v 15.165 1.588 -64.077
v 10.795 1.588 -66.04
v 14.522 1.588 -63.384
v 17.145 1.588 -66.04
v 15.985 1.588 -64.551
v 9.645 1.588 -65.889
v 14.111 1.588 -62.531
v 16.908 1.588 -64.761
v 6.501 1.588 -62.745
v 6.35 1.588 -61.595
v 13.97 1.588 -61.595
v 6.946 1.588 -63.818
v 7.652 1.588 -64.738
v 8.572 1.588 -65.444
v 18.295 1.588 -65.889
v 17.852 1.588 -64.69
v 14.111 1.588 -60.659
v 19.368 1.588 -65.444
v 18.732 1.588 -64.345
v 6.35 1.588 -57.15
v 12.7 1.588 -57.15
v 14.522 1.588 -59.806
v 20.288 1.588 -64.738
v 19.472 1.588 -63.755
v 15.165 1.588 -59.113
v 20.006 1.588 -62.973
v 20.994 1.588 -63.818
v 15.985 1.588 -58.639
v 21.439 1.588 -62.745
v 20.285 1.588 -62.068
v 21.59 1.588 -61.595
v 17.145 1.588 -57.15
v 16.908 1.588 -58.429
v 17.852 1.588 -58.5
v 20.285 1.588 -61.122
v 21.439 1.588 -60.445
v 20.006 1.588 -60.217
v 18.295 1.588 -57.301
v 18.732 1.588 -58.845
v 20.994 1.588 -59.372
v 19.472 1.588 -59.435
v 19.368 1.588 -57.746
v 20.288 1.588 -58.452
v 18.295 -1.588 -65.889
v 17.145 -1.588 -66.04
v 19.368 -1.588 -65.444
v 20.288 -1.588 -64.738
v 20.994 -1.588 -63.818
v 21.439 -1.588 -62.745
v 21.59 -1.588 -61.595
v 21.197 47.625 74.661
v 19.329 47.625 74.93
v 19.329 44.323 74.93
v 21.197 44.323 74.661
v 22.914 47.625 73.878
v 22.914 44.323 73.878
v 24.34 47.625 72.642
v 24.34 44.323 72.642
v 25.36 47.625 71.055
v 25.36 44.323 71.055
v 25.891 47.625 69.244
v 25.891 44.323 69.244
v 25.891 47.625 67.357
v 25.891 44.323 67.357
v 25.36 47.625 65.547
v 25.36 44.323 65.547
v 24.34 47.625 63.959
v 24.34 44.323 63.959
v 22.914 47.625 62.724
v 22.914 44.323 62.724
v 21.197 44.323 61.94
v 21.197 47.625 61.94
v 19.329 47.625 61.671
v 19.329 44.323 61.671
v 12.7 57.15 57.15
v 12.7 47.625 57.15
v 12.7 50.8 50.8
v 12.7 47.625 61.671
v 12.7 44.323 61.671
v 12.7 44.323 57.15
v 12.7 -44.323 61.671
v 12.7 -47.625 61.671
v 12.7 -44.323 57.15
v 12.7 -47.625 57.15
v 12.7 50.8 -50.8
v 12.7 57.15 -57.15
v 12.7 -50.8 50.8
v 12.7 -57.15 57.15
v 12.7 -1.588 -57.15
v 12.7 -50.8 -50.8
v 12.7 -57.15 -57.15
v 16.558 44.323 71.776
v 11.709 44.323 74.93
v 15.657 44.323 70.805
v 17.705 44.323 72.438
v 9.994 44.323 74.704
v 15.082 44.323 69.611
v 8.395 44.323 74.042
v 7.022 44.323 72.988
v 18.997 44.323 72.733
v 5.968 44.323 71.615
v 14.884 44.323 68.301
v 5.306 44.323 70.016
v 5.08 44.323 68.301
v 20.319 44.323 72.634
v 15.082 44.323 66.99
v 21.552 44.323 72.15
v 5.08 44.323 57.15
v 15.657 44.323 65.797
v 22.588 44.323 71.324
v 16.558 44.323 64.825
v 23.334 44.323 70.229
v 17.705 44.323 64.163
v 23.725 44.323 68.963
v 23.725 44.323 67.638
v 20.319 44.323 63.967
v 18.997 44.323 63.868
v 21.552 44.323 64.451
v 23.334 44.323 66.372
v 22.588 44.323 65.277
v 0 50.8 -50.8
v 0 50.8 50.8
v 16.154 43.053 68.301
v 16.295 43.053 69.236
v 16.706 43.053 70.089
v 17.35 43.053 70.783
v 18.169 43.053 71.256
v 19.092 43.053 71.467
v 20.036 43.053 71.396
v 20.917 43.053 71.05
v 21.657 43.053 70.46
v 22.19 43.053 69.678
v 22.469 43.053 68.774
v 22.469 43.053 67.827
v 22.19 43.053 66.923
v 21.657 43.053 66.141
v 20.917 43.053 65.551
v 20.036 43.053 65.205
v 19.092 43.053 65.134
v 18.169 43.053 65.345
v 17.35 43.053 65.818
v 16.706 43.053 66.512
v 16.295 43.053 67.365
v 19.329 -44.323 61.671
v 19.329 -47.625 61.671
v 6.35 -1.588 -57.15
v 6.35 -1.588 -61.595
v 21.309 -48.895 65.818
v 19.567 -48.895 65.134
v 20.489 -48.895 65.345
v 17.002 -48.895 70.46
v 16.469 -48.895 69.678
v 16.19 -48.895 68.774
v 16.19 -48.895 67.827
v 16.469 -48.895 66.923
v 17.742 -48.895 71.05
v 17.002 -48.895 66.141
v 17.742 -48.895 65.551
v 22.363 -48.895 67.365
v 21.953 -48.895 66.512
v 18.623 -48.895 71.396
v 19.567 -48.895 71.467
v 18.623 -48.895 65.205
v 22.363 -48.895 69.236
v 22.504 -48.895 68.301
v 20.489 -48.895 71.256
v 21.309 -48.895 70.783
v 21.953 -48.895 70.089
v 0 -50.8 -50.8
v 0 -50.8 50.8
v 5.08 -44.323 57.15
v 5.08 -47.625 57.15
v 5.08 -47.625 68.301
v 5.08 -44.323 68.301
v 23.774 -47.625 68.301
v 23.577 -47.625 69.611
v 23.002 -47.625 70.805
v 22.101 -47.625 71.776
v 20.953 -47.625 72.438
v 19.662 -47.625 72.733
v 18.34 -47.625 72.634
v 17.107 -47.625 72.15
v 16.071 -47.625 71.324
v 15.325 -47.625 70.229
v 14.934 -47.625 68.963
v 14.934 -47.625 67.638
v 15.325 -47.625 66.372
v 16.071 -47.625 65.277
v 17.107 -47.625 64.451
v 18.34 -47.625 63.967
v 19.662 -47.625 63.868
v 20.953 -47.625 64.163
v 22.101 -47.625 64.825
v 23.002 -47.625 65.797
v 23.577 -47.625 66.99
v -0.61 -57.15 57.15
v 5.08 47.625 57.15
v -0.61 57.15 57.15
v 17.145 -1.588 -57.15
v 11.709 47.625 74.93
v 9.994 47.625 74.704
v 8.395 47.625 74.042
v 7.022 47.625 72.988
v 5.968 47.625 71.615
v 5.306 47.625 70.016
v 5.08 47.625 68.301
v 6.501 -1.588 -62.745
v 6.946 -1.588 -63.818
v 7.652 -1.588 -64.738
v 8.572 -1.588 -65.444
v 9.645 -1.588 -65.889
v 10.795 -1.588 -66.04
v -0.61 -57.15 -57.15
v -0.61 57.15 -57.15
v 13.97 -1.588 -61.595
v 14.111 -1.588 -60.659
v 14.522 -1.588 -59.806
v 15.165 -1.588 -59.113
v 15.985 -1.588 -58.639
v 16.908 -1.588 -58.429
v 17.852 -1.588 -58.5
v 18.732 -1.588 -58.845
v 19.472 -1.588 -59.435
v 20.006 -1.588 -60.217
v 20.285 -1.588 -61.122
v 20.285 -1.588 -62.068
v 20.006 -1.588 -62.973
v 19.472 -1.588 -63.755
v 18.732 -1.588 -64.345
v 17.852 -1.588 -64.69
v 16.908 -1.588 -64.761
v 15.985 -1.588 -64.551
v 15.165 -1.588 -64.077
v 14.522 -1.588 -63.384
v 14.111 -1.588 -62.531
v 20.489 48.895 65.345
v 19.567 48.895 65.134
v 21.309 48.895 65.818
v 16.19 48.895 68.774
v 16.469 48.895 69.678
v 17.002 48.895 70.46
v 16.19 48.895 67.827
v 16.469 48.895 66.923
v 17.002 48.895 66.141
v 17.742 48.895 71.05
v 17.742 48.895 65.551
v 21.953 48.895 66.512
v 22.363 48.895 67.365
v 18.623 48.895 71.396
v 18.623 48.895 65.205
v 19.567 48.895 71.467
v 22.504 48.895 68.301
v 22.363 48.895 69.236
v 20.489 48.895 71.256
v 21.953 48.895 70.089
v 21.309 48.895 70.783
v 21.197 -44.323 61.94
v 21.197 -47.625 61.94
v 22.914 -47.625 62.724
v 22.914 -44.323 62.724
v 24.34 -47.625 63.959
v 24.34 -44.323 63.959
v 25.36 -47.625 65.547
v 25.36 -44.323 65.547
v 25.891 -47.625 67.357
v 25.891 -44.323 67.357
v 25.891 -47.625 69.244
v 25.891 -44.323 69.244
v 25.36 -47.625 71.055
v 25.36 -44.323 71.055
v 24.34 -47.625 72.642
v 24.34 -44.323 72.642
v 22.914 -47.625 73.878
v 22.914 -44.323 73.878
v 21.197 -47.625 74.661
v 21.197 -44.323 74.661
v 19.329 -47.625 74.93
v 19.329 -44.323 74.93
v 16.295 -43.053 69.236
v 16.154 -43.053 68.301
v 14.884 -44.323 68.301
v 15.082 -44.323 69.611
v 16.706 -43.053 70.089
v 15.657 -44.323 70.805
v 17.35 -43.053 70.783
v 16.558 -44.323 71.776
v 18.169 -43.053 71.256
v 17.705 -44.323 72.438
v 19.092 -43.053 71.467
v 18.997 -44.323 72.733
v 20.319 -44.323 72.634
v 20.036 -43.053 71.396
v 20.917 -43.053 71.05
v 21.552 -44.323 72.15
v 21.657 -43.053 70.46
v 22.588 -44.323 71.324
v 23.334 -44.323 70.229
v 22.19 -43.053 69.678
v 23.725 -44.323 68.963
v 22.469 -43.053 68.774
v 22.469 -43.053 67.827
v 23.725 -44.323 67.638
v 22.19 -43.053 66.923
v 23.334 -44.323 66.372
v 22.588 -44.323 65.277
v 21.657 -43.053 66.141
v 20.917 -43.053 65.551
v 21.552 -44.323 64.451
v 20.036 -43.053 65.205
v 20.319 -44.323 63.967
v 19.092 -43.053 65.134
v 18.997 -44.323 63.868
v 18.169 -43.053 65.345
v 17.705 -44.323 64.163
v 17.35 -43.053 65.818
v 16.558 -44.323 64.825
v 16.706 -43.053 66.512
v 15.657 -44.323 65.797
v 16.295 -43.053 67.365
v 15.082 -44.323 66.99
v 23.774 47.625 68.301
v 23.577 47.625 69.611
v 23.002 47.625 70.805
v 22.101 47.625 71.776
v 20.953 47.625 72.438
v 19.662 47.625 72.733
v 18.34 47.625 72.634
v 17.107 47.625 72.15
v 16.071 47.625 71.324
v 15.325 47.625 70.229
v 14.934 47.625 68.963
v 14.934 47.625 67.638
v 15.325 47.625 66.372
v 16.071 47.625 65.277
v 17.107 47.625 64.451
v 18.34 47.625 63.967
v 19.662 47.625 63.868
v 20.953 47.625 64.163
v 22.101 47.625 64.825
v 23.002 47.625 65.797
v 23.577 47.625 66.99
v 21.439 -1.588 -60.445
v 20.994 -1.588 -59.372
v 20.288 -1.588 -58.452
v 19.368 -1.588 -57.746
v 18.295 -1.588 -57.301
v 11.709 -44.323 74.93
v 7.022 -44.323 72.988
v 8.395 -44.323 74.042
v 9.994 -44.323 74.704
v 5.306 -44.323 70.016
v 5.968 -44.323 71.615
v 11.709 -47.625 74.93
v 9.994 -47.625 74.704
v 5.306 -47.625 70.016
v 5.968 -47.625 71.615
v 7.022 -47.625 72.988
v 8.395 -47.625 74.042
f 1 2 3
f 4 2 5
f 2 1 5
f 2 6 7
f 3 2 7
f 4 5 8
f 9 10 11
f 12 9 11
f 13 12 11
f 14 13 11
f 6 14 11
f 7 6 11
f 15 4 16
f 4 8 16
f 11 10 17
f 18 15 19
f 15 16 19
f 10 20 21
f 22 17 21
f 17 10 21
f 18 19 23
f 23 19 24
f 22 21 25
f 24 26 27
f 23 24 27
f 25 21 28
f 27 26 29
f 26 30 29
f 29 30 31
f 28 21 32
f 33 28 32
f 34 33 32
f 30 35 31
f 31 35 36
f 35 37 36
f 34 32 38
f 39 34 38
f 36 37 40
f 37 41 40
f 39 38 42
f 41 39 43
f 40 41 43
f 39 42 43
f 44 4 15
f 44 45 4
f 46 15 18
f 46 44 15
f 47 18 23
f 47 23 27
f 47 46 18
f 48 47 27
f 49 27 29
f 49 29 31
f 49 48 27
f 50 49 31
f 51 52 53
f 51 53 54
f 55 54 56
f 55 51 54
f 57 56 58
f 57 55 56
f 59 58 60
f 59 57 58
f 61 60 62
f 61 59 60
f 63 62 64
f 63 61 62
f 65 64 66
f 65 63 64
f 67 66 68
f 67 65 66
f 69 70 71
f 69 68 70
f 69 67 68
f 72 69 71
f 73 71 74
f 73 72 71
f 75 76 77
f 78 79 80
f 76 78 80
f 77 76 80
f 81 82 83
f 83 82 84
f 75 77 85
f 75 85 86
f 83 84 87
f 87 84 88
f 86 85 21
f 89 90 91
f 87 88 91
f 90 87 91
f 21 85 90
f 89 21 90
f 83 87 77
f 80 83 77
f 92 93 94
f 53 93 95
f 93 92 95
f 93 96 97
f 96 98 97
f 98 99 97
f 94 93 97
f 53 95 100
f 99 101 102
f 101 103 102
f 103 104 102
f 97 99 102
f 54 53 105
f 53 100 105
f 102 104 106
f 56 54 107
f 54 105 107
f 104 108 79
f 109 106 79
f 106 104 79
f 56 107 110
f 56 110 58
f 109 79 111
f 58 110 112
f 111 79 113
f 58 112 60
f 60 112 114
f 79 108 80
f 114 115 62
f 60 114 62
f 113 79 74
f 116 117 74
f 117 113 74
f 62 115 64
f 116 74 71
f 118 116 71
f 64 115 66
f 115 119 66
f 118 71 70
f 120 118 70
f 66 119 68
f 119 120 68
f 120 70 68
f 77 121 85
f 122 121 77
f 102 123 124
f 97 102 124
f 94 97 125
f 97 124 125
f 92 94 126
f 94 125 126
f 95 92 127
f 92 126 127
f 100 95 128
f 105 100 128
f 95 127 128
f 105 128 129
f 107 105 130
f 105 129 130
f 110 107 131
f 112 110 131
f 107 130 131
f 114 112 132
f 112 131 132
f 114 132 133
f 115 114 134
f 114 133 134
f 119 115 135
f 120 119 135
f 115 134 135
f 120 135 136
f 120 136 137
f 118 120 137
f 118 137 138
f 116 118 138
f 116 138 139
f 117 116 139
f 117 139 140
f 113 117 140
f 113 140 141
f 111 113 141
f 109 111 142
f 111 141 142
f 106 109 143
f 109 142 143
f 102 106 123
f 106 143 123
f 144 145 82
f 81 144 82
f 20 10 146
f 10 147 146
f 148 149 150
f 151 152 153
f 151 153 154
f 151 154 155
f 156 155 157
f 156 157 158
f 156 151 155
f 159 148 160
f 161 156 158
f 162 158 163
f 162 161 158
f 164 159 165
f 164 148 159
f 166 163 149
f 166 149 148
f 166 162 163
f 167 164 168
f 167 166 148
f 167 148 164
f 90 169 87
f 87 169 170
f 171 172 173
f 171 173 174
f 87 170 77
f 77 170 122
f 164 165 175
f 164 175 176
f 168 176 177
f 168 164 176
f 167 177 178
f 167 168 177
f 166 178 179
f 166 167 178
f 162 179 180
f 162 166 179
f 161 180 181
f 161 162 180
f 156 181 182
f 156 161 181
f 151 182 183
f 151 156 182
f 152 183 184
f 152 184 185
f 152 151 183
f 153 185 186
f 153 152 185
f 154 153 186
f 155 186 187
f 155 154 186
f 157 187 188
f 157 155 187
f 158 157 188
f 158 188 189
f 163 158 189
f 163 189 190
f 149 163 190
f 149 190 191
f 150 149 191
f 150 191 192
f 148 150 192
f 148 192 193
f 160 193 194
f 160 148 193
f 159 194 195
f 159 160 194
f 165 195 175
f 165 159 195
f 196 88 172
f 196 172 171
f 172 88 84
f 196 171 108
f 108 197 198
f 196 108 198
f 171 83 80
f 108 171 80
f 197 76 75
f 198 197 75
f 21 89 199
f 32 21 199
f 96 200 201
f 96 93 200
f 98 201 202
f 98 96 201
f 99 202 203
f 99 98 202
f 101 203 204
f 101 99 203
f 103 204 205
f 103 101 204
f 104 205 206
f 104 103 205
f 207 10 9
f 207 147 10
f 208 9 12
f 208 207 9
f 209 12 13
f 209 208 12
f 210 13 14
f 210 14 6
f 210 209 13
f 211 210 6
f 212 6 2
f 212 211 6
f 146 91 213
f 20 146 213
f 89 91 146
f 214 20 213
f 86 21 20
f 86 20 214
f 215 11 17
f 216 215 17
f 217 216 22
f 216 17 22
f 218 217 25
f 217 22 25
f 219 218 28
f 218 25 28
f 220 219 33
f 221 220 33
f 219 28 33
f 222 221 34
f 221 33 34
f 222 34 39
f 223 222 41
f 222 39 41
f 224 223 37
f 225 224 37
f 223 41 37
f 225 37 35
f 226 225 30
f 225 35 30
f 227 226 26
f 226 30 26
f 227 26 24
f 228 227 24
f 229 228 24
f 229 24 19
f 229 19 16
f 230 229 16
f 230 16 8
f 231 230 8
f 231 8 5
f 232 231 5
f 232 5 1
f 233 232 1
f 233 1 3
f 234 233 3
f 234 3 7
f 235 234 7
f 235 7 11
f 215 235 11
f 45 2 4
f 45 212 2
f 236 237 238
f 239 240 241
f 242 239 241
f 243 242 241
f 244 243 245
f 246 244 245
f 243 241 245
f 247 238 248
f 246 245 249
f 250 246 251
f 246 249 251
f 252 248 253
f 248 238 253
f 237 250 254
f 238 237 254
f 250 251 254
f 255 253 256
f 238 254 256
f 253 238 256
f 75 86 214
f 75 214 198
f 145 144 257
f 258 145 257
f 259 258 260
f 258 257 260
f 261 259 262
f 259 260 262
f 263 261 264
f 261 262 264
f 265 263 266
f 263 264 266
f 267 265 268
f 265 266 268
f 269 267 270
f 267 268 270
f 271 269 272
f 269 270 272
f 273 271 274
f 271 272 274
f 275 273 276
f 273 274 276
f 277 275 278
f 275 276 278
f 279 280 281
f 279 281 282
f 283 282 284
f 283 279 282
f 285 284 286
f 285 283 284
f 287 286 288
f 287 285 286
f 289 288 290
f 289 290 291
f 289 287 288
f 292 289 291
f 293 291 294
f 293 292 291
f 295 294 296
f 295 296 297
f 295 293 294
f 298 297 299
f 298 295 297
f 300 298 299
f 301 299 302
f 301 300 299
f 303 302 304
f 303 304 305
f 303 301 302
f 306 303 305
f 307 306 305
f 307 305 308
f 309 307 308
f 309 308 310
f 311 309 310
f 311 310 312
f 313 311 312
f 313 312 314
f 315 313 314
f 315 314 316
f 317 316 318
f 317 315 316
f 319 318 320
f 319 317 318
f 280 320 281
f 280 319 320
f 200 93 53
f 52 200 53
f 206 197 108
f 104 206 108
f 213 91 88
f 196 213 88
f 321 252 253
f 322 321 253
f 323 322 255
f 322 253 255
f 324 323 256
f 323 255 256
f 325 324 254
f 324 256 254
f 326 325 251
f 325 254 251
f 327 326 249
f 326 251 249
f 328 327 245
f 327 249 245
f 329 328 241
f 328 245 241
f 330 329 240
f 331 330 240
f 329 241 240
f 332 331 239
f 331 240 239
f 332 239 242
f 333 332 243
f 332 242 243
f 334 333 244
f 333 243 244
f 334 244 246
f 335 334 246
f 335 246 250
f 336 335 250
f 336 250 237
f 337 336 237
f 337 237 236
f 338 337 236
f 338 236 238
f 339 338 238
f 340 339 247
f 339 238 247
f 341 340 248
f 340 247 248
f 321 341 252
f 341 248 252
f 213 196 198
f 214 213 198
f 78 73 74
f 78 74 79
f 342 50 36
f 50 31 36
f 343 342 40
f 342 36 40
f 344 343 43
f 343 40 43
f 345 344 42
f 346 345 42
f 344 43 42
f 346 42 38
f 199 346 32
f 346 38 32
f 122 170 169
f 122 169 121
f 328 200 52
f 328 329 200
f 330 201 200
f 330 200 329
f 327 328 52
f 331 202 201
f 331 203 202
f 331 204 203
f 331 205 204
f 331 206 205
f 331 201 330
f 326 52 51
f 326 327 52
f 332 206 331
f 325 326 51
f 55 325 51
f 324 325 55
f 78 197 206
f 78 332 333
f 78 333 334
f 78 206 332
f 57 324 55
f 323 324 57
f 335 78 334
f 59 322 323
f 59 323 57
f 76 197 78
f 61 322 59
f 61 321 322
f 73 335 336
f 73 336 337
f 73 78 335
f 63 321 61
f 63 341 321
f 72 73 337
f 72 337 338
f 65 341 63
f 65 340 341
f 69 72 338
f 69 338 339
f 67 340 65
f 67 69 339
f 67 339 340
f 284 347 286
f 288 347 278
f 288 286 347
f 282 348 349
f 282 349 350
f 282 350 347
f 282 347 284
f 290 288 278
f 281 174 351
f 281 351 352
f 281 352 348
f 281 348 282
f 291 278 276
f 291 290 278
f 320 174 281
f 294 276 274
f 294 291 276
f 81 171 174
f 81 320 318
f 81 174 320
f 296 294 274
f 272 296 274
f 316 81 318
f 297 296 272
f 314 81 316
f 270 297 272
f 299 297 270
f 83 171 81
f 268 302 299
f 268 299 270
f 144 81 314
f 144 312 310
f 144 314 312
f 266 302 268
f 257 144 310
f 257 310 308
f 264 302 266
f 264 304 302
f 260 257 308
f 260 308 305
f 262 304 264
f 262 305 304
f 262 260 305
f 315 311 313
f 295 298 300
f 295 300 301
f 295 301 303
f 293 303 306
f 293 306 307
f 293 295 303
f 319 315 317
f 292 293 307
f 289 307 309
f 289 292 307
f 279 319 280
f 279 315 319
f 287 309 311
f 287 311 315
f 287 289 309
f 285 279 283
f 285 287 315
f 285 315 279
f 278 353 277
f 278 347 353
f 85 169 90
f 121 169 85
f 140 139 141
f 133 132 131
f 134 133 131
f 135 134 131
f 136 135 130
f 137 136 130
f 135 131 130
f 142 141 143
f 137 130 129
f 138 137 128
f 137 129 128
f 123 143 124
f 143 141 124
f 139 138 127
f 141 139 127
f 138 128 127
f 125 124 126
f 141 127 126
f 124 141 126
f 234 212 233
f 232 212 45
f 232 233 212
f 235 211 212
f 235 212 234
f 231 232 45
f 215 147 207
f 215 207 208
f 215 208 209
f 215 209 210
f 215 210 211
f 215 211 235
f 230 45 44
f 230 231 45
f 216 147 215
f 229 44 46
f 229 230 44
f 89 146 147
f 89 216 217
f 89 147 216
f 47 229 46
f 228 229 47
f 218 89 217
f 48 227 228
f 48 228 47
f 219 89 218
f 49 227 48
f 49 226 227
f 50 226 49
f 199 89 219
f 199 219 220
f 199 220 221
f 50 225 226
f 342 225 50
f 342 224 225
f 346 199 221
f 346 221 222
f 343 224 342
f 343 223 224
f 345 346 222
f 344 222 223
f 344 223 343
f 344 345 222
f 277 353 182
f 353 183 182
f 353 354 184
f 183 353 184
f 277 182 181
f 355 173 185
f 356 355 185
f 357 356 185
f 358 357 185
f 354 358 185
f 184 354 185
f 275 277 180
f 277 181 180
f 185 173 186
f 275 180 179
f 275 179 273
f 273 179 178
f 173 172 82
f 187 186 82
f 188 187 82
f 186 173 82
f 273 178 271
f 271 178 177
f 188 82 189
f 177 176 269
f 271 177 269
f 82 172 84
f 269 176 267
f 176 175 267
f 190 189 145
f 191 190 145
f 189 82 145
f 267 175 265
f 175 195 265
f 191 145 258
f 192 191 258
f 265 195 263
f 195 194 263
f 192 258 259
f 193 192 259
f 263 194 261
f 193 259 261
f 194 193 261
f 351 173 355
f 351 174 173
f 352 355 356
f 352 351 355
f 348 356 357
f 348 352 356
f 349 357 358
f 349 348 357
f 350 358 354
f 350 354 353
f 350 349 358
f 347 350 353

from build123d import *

# Parameters (mm, degrees)
F0_W      = 114.3
F0_H      = 114.3
F0_W_2    = 101.6
F0_H_2    = 101.6
F1_DEPTH  = 12.7
F2_W      = 114.3
F2_H      = 114.3
F3_DEPTH  = 0.6096
F4_W      = 20.8788
F4_H      = 3.302
F5_DEPTH  = 17.78
F6_R      = 6.6294
F8_DEPTH  = 6.35
F9_R      = 6.6294
F10_R     = 4.445
F11_DEPTH = 1.27
F12_R     = 4.445
F13_DEPTH = 1.27
F14_SIZE  = 1.26999
F15_W     = 15.24
F15_H     = 8.89
F16_DEPTH = 1.5875
F17_R     = 4.44499
F18_R     = 3.175
F19_DEPTH = 25.4


# Not quite as in the source:
# - a fillet or chamfer is up to 0.001 mm smaller than in the source, because OpenCascade refuses the exact size
# - a pattern or mirror of a feature is missing from the dataset's text; its kind, count and spacing are read off the source's solid


with BuildPart() as f1:
    # F0 (on Right) → F1 (new body)
    with BuildSketch(Plane.YZ):
        Rectangle(F0_W, F0_H)
        Rectangle(F0_W_2, F0_H_2, mode=Mode.SUBTRACT)
    extrude(amount=F1_DEPTH)

    # F2 (on Right) → F3 (join)
    with BuildSketch(Plane.YZ):
        Rectangle(F2_W, F2_H)
    extrude(amount=-F3_DEPTH)

    # F4 (on face) → F5 (join)
    with BuildSketch(Plane.XY.offset(57.15)):
        with Locations((15.5194, -45.974)):
            Rectangle(F4_W, F4_H)
    f5 = extrude(amount=F5_DEPTH)

    # F5_copies: F5 across plane
    add(f5.mirror(Plane.ZX))

    # F6
    f6_edges = [f1.edges().sort_by_distance(p)[0] for p in [
        (25.9588, -45.974, 74.93),
    ]]
    fillet(f6_edges, radius=F6_R)

    # F7 (on face) → F8 (cut)
    with BuildSketch(Plane.XZ.offset(47.625)):
        with BuildLine():
            ThreePointArc((19.3294, 74.93), (25.9588, 68.3006), (19.3294, 61.6712))
            Line((19.3294, 61.6712), (12.7, 61.6712))
            Line((12.7, 61.6712), (12.7, 57.15))
            Line((12.7, 57.15), (28.7029210806, 51.0326394975))
            Line((28.7029210806, 51.0326394975), (31.0219925225, 81.4440133214))
            Line((31.0219925225, 81.4440133214), (19.3294, 74.93))
        make_face()
    f8 = extrude(amount=-F8_DEPTH, mode=Mode.SUBTRACT)

    # F8_copies: F8 across plane
    add(f8.mirror(Plane.ZX), mode=Mode.SUBTRACT)

    # F9
    f9_edges = [f1.edges().sort_by_distance(p)[0] for p in [
        (5.08, -45.974, 74.93),
        (5.08, 45.974, 74.93),
    ]]
    fillet(f9_edges, radius=F9_R)

    # F10 (on face) → F11 (join)
    with BuildSketch(Plane.XZ.offset(47.625)):
        with Locations((19.3294, 68.3006)):
            Circle(F10_R)
    f11 = extrude(amount=F11_DEPTH)

    # F11_copies: F11 across plane
    add(f11.mirror(Plane.ZX))

    # F12 (on face) → F13 (join)
    with BuildSketch(Plane(origin=(0, -44.323, 0), x_dir=(-1, 0, 0), z_dir=(0, 1, 0))):
        with Locations((-19.3294, 68.3006)):
            Circle(F12_R)
    f13 = extrude(amount=F13_DEPTH)

    # F13_copies: F13 across plane
    add(f13.mirror(Plane.ZX))

    # F14 (size 1.27 in the source; OpenCascade refuses exactly that, so slightly less here)
    f14_edges = [f1.edges().sort_by_distance(p)[0] for p in [
        (14.8844, -48.895, 68.3006),
        (23.7744, -43.053, 68.3006),
        (14.8844, 48.895, 68.3006),
        (23.7744, 43.053, 68.3006),
    ]]
    chamfer(f14_edges, length=F14_SIZE)

    # F15 (on Front) → F16 (join, symmetric)
    with BuildSketch(Plane.XZ):
        with Locations((13.97, -61.595)):
            Rectangle(F15_W, F15_H)
    extrude(amount=F16_DEPTH, both=True)

    # F17 (radius 4.445 in the source; OpenCascade refuses exactly that, so slightly less here)
    f17_edges = [f1.edges().sort_by_distance(p)[0] for p in [
        (21.59, 0, -57.15),
        (21.59, 0, -66.04),
        (6.35, 0, -66.04),
    ]]
    fillet(f17_edges, radius=F17_R)

    # F18 (on face) → F19 (cut)
    with BuildSketch(Plane(origin=(0, 1.5875, 0), x_dir=(-1, 0, 0), z_dir=(0, 1, 0))):
        with Locations((-17.145, -61.595)):
            Circle(F18_R)
    extrude(amount=-F19_DEPTH, mode=Mode.SUBTRACT)


solid = f1.part
